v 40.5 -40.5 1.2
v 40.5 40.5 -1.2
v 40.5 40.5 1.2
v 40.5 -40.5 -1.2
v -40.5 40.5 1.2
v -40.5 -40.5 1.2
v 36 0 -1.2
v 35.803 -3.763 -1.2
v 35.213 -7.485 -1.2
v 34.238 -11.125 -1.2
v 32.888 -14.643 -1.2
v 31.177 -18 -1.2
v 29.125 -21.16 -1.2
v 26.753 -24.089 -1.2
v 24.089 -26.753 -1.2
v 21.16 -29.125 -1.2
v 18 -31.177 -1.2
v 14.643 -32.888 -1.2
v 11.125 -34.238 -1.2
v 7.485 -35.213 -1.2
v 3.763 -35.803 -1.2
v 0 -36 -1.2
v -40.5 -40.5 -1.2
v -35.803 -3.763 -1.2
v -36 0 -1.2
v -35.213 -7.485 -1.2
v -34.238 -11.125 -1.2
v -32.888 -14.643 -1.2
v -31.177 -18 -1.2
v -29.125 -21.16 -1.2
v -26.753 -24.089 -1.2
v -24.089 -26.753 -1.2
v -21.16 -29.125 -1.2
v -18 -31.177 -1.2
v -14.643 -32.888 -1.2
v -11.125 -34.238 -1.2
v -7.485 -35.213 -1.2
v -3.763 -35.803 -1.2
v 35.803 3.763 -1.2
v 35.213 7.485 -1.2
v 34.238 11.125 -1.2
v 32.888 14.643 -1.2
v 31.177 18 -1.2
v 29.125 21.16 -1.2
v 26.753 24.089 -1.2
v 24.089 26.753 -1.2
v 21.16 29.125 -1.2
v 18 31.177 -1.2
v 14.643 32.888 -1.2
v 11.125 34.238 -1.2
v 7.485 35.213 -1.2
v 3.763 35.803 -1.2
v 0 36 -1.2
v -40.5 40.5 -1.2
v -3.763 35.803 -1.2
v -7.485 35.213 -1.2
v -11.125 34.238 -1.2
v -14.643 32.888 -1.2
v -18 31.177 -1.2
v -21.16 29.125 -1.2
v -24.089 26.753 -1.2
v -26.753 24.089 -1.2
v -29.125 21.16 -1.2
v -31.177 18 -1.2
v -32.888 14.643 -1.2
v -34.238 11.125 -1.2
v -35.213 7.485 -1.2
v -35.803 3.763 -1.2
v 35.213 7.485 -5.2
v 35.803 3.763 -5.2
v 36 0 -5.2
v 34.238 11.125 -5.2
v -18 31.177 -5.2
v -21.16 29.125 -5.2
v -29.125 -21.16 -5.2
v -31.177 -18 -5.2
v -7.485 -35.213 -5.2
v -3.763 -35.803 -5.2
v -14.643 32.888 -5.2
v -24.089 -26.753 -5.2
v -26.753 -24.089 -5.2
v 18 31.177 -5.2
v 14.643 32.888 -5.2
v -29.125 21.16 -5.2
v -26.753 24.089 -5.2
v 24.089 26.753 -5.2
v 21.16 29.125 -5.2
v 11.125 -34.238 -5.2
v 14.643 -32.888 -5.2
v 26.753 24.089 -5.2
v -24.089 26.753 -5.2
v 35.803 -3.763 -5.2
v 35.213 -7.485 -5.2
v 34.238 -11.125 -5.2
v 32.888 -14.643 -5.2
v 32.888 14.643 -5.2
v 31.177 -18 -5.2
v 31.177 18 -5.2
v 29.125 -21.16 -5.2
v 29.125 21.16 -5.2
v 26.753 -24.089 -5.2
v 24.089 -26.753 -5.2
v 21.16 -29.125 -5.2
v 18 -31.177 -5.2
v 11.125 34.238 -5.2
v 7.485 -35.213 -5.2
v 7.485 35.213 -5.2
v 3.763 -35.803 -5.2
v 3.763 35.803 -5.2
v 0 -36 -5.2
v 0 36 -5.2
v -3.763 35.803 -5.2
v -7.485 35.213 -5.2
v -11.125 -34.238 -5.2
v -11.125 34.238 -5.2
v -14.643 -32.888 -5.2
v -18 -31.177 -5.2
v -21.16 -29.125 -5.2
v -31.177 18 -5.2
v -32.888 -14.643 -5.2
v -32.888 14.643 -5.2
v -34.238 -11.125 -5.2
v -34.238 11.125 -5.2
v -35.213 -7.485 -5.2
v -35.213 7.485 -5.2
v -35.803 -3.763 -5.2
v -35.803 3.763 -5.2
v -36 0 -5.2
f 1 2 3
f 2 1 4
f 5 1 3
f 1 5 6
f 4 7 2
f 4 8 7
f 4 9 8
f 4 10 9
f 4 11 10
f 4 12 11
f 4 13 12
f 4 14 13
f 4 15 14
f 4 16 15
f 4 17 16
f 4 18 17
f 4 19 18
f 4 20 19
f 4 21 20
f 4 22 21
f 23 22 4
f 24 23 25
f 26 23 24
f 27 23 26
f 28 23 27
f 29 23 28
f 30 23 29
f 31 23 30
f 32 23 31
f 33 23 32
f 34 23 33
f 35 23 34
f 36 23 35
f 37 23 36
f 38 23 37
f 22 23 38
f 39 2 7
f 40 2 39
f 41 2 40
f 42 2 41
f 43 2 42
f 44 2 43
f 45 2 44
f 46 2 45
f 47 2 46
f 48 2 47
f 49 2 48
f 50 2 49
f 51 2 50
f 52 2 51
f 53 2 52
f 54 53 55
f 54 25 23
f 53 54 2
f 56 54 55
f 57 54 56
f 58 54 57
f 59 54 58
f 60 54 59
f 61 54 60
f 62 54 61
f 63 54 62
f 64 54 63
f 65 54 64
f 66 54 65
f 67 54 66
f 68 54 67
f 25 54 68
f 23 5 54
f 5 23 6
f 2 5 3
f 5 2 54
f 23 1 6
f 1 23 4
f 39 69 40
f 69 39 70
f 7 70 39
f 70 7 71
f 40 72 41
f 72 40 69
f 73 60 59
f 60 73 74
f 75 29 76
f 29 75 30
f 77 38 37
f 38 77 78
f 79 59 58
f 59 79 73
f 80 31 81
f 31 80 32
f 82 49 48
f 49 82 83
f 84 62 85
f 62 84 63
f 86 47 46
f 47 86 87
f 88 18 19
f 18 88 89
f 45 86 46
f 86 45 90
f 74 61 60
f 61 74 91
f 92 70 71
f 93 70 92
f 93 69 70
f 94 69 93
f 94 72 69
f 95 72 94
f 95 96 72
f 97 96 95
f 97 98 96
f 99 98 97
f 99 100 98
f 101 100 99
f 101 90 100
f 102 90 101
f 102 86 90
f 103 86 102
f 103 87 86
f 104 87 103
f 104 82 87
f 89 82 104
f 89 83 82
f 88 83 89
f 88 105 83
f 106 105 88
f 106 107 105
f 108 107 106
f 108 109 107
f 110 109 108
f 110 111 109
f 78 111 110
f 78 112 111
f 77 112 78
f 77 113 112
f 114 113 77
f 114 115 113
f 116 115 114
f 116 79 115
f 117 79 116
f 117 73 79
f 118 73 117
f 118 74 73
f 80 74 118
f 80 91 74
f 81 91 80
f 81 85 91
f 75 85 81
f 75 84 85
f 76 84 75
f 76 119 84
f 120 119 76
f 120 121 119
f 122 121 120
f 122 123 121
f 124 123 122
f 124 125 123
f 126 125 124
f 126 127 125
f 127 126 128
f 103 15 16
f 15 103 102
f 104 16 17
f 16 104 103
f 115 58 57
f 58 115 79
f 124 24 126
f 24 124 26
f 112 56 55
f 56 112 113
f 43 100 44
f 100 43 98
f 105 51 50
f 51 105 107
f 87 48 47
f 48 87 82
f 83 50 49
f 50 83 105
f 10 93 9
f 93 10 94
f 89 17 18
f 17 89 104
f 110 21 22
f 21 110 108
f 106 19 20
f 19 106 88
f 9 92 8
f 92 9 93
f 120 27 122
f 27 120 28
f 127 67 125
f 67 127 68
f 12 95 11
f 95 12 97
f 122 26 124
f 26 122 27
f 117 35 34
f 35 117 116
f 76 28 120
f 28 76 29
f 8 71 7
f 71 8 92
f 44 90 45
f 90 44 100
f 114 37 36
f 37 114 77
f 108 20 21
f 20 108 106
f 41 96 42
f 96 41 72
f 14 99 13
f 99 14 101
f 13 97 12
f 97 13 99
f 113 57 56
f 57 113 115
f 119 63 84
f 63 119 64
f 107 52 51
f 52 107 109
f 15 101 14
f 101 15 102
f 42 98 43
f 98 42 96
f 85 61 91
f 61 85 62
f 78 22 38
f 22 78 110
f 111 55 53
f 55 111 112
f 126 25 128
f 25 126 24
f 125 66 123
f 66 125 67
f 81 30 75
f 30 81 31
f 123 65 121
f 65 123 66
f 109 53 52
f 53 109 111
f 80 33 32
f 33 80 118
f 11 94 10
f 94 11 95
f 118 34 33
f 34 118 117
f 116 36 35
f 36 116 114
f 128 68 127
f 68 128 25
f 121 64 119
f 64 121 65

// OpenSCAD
// Press-fit end cap for 80 mm extrusion.
$fn = 60;
eps = 0.02;
profile = 80;
cap_t = 2.4;
wall = 4;
pin_d = profile - 2 * wall;
pin_l = 4;
union() {
    cube([profile + 1, profile + 1, cap_t], center = true);
    translate([0, 0, -cap_t / 2 - pin_l]) cylinder(d = pin_d, h = pin_l + eps);
}
